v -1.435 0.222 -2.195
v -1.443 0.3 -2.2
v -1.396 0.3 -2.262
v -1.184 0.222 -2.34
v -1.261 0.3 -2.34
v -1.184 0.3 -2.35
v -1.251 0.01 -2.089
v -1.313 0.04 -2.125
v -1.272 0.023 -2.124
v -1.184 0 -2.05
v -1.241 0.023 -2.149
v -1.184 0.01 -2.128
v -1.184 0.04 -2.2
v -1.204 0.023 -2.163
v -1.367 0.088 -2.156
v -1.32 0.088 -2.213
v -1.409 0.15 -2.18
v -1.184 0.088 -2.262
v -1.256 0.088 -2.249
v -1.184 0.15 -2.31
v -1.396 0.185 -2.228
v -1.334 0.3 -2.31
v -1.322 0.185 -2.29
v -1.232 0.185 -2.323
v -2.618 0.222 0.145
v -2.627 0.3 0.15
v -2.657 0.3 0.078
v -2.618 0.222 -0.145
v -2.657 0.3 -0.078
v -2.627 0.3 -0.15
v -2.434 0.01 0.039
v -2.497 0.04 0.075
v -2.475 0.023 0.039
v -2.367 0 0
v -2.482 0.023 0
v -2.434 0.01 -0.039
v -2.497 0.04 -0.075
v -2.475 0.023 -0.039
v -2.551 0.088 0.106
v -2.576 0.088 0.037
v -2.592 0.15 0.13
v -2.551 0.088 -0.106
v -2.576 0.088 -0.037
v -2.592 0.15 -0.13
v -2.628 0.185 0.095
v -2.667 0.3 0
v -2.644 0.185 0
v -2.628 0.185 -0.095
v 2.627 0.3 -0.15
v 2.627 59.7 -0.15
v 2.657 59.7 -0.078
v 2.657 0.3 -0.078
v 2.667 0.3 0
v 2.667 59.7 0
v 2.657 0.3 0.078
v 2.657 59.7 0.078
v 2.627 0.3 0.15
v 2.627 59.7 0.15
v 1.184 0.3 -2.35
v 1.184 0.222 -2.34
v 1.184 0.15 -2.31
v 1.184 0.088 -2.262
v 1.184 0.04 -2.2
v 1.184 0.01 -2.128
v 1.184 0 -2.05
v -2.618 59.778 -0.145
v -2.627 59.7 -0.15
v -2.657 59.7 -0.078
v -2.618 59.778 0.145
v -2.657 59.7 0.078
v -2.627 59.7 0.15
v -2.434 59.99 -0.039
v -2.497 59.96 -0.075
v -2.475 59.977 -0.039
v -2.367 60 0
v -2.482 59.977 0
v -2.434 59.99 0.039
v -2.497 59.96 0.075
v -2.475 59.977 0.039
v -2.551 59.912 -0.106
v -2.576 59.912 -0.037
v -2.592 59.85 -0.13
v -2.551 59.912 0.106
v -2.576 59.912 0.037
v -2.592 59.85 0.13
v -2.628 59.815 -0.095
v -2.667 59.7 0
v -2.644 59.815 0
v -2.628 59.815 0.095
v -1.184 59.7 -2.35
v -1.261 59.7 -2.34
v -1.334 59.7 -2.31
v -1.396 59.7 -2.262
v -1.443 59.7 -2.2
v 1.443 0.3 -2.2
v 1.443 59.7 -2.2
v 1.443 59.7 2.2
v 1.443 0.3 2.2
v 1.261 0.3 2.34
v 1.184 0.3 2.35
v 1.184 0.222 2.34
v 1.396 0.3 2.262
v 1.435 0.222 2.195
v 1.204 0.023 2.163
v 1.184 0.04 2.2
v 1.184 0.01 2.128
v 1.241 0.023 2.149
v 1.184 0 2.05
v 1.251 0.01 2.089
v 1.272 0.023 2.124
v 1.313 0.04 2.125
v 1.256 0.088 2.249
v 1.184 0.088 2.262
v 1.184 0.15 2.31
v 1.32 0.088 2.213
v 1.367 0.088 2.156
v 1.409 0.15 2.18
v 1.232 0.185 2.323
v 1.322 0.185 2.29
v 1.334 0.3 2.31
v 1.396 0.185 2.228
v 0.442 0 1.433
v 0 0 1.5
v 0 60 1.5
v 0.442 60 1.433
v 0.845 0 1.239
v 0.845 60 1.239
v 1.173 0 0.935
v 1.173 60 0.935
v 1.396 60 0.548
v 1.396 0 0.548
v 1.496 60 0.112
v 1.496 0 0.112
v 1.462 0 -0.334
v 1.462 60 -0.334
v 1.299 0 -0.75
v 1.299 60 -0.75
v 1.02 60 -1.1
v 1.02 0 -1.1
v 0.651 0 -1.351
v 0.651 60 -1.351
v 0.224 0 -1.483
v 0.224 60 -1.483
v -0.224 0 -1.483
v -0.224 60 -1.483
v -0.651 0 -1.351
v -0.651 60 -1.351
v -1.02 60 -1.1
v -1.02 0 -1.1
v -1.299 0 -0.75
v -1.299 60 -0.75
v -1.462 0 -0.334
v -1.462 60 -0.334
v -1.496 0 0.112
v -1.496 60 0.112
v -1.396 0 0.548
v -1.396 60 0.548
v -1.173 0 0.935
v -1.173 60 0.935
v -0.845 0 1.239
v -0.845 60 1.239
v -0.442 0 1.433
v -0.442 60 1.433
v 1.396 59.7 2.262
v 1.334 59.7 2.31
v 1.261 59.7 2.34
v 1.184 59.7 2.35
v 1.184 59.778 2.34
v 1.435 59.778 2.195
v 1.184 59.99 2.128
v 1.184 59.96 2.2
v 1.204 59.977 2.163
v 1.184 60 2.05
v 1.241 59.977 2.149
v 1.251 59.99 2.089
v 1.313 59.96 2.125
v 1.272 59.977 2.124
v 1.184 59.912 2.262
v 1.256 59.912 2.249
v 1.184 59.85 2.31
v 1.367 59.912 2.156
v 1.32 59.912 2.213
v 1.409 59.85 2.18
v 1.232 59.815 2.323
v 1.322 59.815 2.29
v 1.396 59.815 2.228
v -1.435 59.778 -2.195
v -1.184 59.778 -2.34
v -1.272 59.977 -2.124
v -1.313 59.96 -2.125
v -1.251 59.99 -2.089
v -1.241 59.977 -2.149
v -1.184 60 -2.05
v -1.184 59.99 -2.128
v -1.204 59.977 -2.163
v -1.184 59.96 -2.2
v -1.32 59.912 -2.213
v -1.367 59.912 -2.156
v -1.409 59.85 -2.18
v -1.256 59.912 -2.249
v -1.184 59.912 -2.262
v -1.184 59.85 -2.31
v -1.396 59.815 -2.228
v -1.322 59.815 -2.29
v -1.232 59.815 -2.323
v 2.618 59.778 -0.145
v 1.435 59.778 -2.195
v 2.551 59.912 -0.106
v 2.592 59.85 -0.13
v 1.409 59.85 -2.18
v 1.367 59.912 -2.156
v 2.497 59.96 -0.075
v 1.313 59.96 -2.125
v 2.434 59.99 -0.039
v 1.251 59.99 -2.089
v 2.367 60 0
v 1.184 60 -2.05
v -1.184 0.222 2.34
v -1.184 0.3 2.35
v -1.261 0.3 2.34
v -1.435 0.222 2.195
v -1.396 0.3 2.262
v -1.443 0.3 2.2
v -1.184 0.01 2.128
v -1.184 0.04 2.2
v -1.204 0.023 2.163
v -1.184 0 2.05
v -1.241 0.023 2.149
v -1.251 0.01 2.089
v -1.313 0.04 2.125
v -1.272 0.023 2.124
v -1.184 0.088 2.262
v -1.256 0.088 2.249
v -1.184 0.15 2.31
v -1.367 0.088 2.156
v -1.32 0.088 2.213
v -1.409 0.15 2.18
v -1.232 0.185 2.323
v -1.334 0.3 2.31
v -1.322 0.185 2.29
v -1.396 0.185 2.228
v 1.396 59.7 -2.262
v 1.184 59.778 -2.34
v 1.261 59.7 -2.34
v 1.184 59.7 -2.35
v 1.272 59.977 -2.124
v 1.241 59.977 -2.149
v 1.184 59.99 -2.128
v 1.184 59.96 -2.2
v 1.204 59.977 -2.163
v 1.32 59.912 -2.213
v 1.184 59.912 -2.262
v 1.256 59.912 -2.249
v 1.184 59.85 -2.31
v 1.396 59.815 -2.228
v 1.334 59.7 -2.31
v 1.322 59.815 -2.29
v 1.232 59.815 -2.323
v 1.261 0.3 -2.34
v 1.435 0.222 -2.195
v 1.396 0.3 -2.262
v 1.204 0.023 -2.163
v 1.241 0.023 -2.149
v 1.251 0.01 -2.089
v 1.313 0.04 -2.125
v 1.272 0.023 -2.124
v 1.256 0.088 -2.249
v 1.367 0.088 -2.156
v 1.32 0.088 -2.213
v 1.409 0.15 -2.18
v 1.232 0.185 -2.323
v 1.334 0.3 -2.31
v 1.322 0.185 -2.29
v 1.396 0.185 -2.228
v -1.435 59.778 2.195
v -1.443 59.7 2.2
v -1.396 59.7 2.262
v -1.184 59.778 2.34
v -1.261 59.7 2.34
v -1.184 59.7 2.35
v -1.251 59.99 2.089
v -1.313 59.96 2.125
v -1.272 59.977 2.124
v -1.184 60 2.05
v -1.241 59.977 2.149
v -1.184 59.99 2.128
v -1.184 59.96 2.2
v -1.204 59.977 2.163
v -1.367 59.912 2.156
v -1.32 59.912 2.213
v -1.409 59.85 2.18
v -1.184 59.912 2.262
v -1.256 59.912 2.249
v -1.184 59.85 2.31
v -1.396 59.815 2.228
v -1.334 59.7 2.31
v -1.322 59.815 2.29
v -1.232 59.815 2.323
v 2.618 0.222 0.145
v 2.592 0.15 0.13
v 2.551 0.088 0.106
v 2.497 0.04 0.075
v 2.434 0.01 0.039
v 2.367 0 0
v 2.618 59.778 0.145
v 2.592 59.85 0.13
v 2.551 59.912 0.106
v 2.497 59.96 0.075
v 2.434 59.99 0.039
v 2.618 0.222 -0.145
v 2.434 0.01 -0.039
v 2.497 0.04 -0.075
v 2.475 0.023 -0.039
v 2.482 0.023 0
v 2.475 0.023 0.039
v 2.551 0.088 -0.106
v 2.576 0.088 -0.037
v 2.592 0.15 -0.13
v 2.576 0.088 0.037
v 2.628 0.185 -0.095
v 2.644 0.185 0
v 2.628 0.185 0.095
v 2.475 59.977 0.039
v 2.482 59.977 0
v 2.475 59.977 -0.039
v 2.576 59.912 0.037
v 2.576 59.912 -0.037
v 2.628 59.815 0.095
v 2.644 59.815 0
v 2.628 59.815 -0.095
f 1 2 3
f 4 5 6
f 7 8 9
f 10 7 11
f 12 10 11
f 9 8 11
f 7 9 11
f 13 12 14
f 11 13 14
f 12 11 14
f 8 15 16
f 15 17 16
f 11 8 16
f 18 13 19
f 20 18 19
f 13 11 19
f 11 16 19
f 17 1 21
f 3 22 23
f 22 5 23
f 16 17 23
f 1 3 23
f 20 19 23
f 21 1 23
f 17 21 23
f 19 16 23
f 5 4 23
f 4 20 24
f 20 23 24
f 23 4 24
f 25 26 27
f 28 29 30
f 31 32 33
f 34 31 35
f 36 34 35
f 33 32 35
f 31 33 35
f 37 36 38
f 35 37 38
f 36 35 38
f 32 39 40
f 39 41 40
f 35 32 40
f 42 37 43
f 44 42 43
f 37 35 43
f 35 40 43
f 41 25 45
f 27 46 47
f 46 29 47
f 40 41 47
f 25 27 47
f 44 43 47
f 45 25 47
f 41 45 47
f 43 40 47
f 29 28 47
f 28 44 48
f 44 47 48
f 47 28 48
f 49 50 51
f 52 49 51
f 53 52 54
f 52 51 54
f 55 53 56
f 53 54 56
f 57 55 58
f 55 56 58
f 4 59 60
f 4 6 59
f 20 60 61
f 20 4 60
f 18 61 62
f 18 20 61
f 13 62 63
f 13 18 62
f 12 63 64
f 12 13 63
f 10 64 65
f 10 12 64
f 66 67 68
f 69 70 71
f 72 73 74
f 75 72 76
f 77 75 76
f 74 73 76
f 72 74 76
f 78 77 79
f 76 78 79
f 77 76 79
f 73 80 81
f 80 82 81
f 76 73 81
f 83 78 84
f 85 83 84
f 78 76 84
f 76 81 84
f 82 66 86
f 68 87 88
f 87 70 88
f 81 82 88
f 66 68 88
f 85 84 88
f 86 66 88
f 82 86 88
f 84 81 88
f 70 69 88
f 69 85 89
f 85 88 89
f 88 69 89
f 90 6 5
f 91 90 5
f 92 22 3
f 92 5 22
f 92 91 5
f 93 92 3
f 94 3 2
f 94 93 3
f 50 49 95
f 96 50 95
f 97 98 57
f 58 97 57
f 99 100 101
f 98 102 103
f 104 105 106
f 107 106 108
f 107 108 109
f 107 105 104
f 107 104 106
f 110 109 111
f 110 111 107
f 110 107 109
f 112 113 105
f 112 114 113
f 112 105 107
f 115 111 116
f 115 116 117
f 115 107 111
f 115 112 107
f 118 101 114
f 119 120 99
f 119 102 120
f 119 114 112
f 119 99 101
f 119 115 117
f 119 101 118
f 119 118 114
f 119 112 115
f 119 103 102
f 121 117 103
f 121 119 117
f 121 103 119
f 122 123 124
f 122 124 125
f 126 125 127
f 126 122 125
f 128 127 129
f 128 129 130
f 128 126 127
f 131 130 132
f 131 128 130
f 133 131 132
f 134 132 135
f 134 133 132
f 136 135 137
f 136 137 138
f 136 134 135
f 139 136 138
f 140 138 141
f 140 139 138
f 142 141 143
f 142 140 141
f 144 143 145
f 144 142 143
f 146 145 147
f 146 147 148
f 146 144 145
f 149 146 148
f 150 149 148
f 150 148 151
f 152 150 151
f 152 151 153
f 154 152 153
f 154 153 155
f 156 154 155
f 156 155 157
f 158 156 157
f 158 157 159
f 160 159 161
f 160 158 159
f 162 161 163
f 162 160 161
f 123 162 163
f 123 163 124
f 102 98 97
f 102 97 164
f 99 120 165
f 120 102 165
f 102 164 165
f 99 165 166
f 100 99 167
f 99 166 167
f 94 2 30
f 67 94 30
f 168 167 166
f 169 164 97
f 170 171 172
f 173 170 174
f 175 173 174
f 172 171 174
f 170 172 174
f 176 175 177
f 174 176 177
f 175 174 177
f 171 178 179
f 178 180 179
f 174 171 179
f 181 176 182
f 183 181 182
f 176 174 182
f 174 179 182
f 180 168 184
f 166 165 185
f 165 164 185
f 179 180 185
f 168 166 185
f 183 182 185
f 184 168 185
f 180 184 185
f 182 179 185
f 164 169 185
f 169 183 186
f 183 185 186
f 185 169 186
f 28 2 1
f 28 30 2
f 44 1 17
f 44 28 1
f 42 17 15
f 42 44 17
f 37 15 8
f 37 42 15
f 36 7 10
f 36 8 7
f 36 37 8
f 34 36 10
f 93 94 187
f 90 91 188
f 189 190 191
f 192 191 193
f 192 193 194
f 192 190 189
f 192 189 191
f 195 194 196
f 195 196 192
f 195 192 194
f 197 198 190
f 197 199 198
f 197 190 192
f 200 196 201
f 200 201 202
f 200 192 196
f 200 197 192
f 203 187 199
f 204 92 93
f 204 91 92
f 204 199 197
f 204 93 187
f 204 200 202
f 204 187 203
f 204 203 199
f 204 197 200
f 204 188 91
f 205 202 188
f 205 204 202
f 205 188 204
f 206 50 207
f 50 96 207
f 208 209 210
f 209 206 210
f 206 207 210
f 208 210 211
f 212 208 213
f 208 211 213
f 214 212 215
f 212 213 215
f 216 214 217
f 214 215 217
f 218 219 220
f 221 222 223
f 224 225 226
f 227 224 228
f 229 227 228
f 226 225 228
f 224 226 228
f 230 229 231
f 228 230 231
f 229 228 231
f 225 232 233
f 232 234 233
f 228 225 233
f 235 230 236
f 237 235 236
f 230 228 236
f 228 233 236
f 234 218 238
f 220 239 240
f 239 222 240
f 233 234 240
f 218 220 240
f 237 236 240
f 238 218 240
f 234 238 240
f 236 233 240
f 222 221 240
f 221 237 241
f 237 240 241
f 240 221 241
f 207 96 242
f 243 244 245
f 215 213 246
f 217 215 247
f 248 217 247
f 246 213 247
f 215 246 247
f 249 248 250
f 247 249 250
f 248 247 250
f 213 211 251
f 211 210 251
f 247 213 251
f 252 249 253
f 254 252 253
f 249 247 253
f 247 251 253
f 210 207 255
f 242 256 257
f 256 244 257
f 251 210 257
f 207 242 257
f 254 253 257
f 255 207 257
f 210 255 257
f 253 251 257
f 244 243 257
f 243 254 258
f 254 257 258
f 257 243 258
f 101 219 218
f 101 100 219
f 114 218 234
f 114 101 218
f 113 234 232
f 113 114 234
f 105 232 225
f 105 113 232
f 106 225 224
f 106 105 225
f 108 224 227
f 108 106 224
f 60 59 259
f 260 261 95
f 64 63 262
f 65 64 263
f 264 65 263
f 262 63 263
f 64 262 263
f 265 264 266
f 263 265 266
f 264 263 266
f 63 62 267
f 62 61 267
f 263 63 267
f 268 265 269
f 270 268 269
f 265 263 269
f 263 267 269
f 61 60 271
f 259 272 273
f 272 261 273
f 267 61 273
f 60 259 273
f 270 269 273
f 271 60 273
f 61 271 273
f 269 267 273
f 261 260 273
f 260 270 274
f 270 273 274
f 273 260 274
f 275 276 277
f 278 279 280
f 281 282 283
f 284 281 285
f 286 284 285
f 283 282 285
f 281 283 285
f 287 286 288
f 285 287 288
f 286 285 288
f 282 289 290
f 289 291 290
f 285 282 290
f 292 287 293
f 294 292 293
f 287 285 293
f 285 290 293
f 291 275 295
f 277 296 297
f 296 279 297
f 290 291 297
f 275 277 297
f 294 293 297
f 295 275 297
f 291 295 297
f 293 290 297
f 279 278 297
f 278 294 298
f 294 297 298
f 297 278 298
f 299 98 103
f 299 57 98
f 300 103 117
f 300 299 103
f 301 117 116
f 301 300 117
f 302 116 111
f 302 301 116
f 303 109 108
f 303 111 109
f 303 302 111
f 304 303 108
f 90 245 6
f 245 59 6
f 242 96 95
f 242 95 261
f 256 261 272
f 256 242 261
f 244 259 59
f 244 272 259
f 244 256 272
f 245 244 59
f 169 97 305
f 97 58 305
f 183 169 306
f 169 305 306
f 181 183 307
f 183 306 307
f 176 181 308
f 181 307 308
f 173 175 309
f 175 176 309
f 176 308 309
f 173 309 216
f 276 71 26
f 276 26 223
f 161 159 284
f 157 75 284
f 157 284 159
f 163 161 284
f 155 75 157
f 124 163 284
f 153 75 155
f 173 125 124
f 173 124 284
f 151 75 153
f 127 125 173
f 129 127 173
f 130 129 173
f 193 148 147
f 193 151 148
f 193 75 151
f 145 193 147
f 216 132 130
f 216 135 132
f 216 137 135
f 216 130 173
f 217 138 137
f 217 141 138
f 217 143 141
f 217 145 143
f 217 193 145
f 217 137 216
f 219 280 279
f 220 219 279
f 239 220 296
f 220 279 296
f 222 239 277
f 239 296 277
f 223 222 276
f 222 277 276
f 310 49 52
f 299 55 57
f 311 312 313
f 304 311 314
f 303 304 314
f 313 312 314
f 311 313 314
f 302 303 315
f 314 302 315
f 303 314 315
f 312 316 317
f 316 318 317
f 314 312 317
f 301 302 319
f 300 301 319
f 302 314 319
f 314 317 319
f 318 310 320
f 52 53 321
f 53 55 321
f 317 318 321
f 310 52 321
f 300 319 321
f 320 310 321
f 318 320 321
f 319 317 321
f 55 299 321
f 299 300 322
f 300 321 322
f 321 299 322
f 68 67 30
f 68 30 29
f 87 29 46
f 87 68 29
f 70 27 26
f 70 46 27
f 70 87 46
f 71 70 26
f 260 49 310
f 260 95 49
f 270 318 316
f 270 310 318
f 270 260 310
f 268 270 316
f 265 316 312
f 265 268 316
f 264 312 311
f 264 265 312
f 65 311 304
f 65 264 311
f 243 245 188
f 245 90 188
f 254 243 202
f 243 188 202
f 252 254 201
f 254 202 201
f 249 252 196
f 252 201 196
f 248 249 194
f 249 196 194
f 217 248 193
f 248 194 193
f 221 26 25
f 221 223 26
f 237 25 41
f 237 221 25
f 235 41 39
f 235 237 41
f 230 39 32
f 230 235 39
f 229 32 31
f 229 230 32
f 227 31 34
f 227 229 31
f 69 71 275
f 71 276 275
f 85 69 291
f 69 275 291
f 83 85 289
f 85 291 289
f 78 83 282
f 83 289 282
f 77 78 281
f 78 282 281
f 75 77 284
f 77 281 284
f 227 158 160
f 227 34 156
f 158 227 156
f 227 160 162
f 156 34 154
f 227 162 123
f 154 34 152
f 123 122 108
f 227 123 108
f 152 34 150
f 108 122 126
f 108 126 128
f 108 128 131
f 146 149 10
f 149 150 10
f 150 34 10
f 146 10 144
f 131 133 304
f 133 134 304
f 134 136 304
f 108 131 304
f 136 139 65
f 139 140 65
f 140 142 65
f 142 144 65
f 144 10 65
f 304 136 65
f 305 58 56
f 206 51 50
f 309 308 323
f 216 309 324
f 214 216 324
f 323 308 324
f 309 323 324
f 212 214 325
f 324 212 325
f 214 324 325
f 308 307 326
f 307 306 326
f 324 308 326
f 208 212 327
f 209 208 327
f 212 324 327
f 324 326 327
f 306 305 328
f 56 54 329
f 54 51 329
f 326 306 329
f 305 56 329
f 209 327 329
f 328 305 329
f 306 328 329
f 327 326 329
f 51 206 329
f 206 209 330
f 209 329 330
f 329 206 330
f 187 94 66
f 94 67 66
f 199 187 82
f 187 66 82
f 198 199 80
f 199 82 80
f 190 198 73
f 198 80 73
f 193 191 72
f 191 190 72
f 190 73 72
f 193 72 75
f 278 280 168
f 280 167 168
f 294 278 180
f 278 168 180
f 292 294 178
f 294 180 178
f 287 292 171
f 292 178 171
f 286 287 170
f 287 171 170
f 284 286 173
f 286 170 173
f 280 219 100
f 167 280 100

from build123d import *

# Parameters (mm, degrees)
SKETCH_1_R      = 1.5
EXTRUDE_1_DEPTH = 60
FILLET_1_R      = 0.3


with BuildPart() as part:
    # 草图1 → 凸台-拉伸1 (new body)
    with BuildSketch(Plane(origin=(0, 0, 0), x_dir=(1, 0, 0), z_dir=(0, 1, 0))):
        Polygon((2.713546265, 0), (1.356773133, 2.35), (-1.356773133, 2.35), (-2.713546265, 0), (-1.356773133, -2.35), (1.356773133, -2.35), align=None)
        with Locations(Location((0, 0, 0), (0, 0, 270))):
            Circle(SKETCH_1_R, mode=Mode.SUBTRACT)
    extrude(amount=EXTRUDE_1_DEPTH)

    # 圆角1
    fillet_1_edges = [part.edges().sort_by_distance(p)[0] for p in [
        (0, 60, -2.35),
        (1.356773133, 30, 2.35),
        (-1.356773133, 30, 2.35),
        (-2.713546265, 30, 0),
        (-1.356773133, 30, -2.35),
        (1.356773133, 30, -2.35),
        (2.713546265, 30, 0),
        (-2.035159699, 60, -1.175),
        (-2.035159699, 60, 1.175),
        (0, 60, 2.35),
        (2.035159699, 60, 1.175),
        (0, 0, 2.35),
        (-2.035159699, 0, 1.175),
        (-2.035159699, 0, -1.175),
        (2.035159699, 60, -1.175),
        (0, 0, -2.35),
        (2.035159699, 0, -1.175),
        (2.035159699, 0, 1.175),
    ]]
    fillet(fillet_1_edges, radius=FILLET_1_R)


solid = part.part
